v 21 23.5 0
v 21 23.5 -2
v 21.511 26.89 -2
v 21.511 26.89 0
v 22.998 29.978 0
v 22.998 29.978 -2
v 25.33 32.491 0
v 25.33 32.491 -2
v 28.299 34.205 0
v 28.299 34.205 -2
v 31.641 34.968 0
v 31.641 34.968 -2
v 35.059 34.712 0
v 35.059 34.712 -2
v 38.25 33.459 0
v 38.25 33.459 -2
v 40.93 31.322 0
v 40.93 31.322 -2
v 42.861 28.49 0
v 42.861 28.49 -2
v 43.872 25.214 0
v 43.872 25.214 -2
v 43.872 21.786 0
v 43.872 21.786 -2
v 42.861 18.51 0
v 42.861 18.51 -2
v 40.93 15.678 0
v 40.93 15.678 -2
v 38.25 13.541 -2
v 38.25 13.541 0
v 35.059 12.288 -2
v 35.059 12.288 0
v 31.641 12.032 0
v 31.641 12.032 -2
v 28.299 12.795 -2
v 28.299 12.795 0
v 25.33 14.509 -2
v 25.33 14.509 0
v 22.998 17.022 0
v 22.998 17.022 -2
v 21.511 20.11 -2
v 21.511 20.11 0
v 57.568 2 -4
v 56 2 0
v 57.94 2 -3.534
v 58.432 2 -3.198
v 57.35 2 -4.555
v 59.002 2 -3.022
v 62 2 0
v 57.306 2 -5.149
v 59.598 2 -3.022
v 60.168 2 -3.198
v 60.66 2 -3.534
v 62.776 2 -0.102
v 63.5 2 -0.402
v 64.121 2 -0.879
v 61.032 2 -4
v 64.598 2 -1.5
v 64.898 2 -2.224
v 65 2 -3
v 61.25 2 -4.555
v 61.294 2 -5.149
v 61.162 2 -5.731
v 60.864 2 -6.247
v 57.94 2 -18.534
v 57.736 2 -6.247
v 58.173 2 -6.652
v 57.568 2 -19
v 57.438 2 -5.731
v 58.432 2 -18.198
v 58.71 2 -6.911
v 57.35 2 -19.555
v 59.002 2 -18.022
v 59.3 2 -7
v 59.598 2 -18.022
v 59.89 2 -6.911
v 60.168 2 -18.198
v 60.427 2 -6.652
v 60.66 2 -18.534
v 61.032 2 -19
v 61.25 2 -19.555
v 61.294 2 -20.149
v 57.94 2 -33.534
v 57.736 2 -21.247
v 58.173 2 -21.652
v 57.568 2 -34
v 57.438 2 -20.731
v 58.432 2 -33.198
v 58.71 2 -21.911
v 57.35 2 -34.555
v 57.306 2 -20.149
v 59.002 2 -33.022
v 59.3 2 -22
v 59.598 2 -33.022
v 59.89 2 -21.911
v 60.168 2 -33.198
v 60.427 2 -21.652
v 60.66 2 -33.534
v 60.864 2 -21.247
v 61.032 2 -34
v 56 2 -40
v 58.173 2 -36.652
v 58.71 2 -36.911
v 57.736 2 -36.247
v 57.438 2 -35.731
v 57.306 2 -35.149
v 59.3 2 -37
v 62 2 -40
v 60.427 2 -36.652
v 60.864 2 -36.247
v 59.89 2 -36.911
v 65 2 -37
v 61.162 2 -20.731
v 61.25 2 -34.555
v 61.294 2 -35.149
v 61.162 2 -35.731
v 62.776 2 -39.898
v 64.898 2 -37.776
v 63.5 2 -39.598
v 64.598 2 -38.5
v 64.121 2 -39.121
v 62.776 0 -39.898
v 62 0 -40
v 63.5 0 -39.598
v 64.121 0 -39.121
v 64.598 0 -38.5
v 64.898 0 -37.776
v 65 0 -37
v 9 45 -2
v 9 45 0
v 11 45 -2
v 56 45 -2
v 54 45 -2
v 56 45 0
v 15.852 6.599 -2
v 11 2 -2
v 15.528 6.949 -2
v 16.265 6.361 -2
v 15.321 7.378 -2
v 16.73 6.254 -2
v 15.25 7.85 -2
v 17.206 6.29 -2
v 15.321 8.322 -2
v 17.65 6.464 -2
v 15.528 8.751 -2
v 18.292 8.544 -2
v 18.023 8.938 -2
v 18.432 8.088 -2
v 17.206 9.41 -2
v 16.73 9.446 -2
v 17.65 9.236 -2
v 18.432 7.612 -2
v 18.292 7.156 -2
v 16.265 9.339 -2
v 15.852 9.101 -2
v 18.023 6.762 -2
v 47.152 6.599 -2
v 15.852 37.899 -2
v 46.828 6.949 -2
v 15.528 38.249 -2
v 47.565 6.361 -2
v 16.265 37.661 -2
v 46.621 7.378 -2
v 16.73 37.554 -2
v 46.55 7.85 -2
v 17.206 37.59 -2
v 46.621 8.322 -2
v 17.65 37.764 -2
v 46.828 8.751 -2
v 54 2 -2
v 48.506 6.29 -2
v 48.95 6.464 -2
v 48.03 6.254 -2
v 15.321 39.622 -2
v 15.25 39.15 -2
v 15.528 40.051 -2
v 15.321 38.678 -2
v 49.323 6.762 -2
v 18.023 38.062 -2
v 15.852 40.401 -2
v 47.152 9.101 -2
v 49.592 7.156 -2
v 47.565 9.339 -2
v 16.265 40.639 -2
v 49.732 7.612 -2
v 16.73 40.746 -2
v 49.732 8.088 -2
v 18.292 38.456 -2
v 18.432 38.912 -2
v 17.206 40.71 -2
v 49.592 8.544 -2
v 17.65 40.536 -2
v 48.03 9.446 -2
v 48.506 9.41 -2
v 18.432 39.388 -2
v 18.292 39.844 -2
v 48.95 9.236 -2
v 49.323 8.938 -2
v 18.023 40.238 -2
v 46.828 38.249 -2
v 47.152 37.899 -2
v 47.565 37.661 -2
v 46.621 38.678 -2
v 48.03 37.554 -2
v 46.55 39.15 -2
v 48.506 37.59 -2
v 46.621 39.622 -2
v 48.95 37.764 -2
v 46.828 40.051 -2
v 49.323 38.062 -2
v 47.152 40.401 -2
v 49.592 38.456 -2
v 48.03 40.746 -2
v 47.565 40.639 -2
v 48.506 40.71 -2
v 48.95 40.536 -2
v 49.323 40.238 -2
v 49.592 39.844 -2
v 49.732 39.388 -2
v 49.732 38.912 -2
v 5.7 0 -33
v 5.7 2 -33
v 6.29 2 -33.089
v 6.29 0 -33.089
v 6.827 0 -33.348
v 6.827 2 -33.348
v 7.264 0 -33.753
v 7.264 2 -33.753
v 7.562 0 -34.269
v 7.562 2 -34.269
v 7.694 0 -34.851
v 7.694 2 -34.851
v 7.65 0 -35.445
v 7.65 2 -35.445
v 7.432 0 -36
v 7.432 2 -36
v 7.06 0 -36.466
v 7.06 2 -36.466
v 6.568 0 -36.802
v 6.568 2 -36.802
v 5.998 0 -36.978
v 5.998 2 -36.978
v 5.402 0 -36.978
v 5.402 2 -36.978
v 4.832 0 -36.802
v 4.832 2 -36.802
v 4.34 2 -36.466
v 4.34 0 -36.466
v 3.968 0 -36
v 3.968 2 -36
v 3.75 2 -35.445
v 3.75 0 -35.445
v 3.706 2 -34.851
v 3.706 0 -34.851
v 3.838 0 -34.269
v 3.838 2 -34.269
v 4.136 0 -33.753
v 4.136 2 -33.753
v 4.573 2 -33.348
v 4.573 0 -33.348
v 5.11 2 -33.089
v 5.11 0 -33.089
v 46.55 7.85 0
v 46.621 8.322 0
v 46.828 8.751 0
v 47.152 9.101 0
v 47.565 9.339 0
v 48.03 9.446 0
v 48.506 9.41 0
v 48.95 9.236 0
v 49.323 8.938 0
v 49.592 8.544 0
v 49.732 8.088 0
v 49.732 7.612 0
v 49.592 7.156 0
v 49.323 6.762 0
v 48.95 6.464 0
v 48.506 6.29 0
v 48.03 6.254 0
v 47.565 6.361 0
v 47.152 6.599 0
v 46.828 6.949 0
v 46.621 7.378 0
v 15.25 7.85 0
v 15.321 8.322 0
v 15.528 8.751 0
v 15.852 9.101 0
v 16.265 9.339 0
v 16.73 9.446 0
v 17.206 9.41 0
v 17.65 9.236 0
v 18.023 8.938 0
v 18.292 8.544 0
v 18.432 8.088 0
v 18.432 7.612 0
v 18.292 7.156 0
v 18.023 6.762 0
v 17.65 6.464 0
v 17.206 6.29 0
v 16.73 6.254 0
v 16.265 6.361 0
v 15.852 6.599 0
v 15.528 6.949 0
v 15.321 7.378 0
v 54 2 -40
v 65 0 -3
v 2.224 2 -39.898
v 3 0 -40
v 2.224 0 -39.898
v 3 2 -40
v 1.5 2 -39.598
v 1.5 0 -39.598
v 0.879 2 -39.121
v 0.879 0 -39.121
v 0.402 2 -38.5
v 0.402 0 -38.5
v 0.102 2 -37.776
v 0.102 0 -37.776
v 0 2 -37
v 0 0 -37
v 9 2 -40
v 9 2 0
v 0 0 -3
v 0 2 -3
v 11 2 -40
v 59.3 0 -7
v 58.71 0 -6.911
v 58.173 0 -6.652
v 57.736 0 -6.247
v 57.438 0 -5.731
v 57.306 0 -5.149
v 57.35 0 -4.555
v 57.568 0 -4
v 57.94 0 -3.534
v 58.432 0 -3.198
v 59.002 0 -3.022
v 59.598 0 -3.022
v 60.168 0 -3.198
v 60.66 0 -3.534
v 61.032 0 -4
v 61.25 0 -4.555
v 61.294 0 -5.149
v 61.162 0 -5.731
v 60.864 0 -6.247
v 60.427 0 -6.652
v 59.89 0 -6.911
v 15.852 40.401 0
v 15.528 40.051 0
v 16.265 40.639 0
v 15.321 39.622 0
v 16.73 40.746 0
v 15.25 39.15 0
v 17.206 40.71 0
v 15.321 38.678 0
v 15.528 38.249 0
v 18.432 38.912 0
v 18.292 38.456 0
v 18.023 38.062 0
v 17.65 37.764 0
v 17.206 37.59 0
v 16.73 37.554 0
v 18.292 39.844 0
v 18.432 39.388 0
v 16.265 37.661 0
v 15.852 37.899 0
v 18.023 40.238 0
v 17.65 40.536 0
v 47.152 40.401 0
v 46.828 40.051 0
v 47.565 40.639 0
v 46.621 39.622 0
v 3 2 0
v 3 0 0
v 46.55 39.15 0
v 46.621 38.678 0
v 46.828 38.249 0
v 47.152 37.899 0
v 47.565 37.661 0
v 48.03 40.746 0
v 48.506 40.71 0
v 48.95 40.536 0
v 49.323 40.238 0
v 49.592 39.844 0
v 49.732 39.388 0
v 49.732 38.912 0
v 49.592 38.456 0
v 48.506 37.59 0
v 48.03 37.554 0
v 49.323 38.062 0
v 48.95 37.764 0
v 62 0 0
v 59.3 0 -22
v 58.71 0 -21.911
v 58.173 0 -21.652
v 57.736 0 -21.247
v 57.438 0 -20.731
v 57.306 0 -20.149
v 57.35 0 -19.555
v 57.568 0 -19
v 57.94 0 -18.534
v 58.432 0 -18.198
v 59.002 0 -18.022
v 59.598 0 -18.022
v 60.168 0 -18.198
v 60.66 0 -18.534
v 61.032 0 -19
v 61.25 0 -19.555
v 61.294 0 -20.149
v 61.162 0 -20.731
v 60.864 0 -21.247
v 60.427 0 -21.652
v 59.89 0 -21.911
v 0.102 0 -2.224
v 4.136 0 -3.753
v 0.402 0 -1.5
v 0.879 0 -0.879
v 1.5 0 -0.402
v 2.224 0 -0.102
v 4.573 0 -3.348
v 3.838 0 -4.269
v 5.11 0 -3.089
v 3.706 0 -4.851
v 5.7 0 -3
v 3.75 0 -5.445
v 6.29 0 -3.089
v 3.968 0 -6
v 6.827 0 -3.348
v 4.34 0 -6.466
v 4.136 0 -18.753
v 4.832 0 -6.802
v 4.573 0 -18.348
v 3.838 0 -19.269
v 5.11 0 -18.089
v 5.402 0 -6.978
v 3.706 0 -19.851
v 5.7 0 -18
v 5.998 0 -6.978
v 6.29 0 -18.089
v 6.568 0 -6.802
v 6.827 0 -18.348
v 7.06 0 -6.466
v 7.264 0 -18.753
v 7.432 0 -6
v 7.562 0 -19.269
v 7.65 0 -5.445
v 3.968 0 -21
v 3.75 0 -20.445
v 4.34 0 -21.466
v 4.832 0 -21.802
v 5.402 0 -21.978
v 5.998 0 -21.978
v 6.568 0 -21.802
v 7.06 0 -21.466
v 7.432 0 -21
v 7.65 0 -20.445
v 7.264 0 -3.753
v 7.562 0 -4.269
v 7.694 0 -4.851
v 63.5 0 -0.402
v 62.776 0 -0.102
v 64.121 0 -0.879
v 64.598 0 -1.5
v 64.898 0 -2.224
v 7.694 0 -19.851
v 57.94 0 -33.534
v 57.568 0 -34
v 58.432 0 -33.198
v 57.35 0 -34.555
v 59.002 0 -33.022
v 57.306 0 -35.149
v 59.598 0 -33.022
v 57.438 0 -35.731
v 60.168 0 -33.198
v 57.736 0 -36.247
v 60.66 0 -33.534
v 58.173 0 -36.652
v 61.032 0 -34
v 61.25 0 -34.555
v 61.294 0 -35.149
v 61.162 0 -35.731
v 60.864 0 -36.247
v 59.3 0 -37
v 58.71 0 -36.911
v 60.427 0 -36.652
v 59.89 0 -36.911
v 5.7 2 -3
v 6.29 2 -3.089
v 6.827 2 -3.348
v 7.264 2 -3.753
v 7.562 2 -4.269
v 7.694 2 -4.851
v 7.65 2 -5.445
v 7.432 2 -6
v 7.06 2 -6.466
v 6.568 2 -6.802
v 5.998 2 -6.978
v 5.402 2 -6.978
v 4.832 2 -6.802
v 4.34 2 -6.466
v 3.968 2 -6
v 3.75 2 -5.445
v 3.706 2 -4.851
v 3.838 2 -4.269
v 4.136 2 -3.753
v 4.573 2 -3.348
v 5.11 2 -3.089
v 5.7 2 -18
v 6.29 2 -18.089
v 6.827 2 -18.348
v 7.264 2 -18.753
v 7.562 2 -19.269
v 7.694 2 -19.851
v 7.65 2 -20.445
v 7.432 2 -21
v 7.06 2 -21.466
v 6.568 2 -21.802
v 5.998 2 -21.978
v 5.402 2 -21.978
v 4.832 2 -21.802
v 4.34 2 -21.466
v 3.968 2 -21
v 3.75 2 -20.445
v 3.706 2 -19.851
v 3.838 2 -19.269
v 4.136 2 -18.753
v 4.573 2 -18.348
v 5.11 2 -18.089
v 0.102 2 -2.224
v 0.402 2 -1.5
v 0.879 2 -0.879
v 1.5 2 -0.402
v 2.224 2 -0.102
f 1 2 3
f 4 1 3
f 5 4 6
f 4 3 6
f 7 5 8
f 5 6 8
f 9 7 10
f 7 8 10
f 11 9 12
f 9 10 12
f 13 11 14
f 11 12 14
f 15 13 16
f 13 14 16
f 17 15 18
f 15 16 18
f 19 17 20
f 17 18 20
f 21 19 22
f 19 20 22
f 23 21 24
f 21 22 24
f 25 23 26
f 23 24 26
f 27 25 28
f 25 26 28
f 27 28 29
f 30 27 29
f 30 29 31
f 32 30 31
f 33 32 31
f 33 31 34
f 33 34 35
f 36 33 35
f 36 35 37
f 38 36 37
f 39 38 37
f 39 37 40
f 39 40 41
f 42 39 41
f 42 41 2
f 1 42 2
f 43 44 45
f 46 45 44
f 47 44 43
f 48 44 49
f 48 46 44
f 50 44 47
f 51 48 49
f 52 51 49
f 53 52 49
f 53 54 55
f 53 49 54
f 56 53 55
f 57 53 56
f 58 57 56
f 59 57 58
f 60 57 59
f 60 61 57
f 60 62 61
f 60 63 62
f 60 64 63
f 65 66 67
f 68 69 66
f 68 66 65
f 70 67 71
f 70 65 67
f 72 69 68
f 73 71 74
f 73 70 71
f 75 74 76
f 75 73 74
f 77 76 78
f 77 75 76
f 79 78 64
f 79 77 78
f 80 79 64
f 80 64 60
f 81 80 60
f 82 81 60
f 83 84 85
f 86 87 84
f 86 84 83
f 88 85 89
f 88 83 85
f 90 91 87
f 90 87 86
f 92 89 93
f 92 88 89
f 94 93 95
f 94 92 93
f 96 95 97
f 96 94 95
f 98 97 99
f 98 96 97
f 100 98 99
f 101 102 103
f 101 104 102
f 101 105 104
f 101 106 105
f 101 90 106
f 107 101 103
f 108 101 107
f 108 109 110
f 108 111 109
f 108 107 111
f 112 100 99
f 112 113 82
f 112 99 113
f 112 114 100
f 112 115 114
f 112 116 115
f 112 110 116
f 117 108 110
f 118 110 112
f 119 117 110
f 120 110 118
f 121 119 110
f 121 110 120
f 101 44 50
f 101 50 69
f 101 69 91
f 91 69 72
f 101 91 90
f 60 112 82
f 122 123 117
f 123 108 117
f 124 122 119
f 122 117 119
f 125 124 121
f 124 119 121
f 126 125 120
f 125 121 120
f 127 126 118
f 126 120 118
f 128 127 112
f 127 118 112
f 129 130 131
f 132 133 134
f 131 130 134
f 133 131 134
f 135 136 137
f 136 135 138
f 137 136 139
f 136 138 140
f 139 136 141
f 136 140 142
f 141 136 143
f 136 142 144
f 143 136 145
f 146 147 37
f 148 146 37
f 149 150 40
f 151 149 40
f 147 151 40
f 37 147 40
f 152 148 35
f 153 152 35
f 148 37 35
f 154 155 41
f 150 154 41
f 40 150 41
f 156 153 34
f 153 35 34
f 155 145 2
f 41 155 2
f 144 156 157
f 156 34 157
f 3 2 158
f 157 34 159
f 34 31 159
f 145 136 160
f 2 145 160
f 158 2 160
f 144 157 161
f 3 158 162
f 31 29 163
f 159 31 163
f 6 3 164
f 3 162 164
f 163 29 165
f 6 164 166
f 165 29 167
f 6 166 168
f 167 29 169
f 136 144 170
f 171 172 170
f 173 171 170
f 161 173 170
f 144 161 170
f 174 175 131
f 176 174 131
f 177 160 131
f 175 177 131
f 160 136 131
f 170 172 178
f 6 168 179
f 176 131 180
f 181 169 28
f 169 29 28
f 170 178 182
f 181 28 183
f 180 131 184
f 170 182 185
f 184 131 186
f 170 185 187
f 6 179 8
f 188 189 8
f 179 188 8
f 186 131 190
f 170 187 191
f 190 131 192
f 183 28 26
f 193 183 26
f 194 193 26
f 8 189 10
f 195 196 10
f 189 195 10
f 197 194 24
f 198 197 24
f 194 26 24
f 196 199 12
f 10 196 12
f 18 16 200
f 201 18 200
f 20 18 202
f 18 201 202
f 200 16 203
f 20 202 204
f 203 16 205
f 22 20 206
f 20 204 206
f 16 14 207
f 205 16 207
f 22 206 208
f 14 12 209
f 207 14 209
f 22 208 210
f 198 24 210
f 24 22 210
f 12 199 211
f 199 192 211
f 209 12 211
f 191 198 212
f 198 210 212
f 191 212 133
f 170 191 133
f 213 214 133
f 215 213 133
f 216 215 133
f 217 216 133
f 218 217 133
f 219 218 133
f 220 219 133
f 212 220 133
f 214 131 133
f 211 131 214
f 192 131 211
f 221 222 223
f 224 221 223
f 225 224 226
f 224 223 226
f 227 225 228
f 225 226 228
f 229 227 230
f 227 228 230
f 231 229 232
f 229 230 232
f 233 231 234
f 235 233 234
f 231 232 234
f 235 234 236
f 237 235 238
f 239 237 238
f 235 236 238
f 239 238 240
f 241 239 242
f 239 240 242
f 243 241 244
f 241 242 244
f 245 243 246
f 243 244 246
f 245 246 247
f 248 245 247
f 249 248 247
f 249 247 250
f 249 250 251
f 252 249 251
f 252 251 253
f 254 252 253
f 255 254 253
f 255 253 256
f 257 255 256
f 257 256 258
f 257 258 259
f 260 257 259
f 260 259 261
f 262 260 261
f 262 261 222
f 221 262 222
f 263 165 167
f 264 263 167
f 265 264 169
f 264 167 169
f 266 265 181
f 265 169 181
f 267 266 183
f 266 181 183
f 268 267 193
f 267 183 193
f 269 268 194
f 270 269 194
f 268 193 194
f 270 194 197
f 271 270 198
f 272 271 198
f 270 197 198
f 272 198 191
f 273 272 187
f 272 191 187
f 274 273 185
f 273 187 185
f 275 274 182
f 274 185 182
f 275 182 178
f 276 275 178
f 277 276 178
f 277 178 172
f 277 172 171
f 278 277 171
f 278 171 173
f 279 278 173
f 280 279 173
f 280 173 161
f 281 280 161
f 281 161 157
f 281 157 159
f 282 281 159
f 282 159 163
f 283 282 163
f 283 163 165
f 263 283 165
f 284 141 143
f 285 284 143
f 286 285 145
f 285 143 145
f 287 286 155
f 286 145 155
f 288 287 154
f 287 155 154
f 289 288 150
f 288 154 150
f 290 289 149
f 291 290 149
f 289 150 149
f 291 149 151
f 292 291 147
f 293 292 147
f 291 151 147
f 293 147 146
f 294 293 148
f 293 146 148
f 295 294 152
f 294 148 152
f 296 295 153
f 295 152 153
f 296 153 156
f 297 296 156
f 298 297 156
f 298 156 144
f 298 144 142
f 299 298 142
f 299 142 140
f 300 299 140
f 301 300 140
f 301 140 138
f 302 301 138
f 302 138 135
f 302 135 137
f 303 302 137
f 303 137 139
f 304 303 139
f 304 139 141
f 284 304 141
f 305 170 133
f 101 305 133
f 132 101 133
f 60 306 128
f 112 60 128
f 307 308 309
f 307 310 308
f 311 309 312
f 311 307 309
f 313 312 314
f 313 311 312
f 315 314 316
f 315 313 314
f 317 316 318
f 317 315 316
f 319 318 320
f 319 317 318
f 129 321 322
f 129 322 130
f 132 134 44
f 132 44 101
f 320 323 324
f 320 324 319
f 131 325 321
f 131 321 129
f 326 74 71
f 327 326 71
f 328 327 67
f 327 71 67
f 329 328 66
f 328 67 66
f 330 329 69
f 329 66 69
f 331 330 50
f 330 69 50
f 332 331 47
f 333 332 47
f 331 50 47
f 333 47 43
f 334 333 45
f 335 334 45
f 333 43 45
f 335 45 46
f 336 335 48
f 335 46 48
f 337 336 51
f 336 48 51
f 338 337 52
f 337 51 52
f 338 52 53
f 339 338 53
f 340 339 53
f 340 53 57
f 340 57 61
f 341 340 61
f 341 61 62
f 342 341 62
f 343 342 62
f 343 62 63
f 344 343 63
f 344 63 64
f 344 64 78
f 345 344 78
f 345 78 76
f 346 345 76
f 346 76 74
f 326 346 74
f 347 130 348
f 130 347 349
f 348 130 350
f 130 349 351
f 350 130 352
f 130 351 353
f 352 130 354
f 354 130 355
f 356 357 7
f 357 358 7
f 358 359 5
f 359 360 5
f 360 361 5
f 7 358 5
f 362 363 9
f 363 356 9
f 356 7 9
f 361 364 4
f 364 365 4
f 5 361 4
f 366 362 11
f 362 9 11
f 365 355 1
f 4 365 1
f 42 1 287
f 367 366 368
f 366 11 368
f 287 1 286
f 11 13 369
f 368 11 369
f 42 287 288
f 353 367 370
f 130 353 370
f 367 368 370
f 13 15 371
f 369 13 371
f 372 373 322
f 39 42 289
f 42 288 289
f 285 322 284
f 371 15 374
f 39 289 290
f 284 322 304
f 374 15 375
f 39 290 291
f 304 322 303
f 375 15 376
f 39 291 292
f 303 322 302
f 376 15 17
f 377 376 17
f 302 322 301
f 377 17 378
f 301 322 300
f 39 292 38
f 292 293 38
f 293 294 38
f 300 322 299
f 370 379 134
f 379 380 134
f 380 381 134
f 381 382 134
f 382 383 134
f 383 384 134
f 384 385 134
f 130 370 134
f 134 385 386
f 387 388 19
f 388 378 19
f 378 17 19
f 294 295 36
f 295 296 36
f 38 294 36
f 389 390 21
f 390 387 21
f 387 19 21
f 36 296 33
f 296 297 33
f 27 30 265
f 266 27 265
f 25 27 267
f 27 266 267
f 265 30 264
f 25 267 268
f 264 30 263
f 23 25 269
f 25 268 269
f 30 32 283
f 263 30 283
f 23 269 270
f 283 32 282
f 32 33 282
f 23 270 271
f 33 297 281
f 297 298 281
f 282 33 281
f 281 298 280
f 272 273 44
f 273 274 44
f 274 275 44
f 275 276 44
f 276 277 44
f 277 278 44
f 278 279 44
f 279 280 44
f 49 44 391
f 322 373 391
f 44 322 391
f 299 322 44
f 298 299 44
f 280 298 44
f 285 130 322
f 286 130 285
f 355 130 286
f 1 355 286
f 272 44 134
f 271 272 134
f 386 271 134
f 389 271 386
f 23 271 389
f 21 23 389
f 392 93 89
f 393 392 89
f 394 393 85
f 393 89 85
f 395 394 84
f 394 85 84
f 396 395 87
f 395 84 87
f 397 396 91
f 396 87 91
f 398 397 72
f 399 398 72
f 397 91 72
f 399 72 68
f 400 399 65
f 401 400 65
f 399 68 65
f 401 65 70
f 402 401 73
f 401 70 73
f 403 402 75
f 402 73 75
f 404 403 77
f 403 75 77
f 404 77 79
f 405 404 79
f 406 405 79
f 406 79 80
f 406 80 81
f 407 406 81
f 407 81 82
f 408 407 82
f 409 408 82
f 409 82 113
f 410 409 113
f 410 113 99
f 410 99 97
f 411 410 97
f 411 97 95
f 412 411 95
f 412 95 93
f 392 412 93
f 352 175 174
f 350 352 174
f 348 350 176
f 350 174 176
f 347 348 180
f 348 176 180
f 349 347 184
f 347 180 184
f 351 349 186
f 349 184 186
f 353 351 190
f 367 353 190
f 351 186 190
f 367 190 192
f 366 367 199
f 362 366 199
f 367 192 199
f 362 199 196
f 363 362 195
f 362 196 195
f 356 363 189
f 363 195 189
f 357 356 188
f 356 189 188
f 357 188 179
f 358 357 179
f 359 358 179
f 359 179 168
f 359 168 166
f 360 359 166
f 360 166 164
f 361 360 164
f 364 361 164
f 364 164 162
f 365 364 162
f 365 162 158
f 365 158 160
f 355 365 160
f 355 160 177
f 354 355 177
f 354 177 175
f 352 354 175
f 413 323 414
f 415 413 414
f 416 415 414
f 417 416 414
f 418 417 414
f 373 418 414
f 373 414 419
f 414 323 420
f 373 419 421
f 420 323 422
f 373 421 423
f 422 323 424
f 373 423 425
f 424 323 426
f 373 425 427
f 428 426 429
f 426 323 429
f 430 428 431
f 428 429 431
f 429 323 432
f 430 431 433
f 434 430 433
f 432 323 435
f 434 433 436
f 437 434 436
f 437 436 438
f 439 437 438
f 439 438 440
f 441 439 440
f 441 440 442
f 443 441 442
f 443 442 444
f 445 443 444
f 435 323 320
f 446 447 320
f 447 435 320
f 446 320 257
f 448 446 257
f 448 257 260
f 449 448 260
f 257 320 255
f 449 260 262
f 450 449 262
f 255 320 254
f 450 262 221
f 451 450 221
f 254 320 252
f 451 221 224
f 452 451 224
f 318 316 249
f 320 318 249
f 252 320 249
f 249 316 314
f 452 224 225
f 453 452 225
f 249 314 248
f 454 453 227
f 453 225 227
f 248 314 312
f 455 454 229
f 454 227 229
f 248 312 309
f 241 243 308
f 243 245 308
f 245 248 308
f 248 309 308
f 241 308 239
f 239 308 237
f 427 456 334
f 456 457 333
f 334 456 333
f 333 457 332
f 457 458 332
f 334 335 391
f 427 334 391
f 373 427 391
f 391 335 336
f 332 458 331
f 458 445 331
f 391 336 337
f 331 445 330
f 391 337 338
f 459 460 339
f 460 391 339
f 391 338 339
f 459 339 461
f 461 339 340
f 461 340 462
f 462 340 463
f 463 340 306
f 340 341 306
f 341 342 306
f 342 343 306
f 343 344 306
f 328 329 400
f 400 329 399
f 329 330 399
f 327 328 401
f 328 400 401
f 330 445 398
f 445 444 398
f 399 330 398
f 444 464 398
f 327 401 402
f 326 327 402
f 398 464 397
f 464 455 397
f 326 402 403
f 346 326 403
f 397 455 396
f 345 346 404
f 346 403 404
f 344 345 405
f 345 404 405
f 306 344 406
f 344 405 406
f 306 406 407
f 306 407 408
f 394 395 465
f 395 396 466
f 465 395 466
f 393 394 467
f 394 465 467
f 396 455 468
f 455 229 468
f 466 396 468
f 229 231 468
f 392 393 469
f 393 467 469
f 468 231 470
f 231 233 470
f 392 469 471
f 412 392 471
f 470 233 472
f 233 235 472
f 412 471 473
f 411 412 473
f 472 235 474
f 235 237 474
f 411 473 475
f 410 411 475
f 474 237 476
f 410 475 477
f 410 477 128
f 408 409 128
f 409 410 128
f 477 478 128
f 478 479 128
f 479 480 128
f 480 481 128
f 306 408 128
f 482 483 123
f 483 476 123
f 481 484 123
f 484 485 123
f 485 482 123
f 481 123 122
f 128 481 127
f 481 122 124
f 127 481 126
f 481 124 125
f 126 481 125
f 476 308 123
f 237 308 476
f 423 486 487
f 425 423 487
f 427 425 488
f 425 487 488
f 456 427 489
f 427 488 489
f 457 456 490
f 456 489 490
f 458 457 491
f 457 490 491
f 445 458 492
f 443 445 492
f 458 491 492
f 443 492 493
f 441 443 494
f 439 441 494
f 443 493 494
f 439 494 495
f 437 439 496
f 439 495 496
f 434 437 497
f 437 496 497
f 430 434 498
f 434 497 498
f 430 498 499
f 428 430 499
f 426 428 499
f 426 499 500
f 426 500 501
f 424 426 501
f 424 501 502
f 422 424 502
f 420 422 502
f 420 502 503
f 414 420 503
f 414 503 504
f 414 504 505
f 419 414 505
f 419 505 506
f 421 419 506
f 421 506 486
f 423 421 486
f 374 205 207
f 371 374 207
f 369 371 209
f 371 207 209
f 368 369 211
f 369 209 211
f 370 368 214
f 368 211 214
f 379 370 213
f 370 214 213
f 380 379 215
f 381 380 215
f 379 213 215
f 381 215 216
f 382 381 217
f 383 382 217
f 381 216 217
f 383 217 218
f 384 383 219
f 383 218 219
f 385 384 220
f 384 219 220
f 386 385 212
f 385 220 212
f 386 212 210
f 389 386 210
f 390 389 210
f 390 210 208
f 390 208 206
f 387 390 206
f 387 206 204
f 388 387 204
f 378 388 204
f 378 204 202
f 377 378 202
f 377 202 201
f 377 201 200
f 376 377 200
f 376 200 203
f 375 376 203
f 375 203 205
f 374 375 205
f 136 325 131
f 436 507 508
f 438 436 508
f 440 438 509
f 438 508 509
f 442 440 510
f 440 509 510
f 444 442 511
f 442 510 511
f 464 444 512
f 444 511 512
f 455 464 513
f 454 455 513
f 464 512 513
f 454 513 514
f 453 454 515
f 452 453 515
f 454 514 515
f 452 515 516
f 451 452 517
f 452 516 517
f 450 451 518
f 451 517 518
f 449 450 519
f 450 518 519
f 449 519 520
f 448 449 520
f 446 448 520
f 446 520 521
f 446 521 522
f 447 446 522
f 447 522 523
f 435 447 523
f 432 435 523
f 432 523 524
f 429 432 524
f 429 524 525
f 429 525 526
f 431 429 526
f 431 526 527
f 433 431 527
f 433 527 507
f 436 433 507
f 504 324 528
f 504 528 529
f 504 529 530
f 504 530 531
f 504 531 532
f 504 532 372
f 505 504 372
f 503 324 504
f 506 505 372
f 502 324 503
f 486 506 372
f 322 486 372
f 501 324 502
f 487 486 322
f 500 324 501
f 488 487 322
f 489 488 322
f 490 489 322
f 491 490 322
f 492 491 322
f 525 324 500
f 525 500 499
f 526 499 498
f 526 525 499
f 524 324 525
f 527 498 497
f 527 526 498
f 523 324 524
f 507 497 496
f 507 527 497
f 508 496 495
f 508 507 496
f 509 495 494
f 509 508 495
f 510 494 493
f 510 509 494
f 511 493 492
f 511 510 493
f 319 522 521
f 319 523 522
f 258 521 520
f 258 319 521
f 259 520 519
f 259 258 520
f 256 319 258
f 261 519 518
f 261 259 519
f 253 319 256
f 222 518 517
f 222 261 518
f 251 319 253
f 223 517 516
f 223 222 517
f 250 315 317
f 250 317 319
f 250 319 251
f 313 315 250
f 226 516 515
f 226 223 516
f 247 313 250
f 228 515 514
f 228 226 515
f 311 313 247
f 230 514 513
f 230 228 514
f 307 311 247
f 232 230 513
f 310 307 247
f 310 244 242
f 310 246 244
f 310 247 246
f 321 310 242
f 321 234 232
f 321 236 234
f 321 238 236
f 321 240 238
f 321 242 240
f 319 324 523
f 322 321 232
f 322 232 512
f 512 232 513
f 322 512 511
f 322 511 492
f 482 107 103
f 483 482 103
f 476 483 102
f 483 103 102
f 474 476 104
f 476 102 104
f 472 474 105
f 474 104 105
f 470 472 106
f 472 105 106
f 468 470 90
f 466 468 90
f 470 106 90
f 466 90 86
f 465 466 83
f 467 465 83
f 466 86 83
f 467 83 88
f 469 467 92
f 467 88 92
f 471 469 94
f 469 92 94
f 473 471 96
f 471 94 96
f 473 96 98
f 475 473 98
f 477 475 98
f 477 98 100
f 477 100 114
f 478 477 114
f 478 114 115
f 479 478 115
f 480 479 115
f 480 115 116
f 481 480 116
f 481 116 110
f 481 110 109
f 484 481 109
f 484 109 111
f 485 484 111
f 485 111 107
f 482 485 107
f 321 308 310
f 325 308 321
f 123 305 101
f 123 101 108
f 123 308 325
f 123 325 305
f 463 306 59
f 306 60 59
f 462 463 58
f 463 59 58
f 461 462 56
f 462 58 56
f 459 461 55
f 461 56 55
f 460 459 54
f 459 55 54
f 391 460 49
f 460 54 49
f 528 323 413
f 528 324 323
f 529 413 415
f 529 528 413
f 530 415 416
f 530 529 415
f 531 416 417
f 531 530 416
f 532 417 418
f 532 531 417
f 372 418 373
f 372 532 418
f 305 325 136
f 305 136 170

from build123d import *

# Parameters (mm, degrees)
SKETCH_1_W          = 65
SKETCH_1_H          = 40
EXTRUDE_1_DEPTH     = 2
SKETCH_2_R          = 2
CUT_EXTRUDE_1_DEPTH = 77.347887987
SKETCH_3_W          = 47
SKETCH_3_H          = 43
EXTRUDE_2_DEPTH     = 2
RIB_1_REACH         = 84.225
SKETCH_5_WALL_W     = 223.835267426
SKETCH_5_WALL_H     = 2
RIB_2_REACH         = 84.225
SKETCH_6_WALL_W     = 223.835267426
SKETCH_6_WALL_H     = 2
SKETCH_7_R          = 11.5
SKETCH_7_R_2        = 1.6
CUT_EXTRUDE_2_DEPTH = 88.715449038
FILLET_1_R          = 3


with BuildPart() as part:
    # 草图1 → 凸台-拉伸1 (new body)
    with BuildSketch(Plane(origin=(0, 0, 0), x_dir=(1, 0, 0), z_dir=(0, 1, 0))):
        with Locations((32.5, 20)):
            Rectangle(SKETCH_1_W, SKETCH_1_H)
    extrude(amount=EXTRUDE_1_DEPTH)

    # 草图2 → 切除-拉伸1 (cut, through all)
    with BuildSketch(Plane(origin=(0, 2, 0), x_dir=(1, 0, 0), z_dir=(0, 1, 0))):
        with Locations((5.7, 5)):
            Circle(SKETCH_2_R)
        with Locations((5.7, 20)):
            Circle(SKETCH_2_R)
        with Locations((5.7, 35)):
            Circle(SKETCH_2_R)
        with Locations((59.3, 5)):
            Circle(SKETCH_2_R)
        with Locations((59.3, 20)):
            Circle(SKETCH_2_R)
        with Locations((59.3, 35)):
            Circle(SKETCH_2_R)
    extrude(amount=-CUT_EXTRUDE_1_DEPTH, mode=Mode.SUBTRACT)

    # 草图3 → 凸台-拉伸2 (add)
    with BuildSketch(Plane.XY):
        with Locations((32.5, 23.5)):
            Rectangle(SKETCH_3_W, SKETCH_3_H)
    extrude(amount=-EXTRUDE_2_DEPTH)

    # 草图5 wall → 筋1 (add, up to next)
    with BuildSketch(Plane(origin=(9, 23.5, -21), x_dir=(0, 0.749329085481, 0.662197796472), z_dir=(0, 0.662197796472, -0.749329085481)), mode=Mode.PRIVATE) as rib_1_sk1:
        with Locations((0, 1)):
            Rectangle(SKETCH_5_WALL_W, SKETCH_5_WALL_H)
    rib_1_tool1 = extrude(rib_1_sk1.sketch, amount=-RIB_1_REACH, mode=Mode.PRIVATE) - part.part
    add(rib_1_tool1.solids().sort_by_distance((9, 23.5, -21))[0])

    # 草图6 wall → 筋2 (add, up to next)
    with BuildSketch(Plane(origin=(56, 23.5, -21), x_dir=(0, -0.749329085481, -0.662197796472), z_dir=(0, 0.662197796472, -0.749329085481)), mode=Mode.PRIVATE) as rib_2_sk1:
        with Locations((0, 1)):
            Rectangle(SKETCH_6_WALL_W, SKETCH_6_WALL_H)
    rib_2_tool1 = extrude(rib_2_sk1.sketch, amount=-RIB_2_REACH, mode=Mode.PRIVATE) - part.part
    add(rib_2_tool1.solids().sort_by_distance((56, 23.5, -21))[0])

    # 草图7 → 切除-拉伸2 (cut, through all)
    with BuildSketch(Plane(origin=(0, 0, -2), x_dir=(-1, 0, 0), z_dir=(0, 0, -1))):
        with Locations((-32.5, 23.5)):
            Circle(SKETCH_7_R)
        with Locations((-48.15, 7.85)):
            Circle(SKETCH_7_R_2)
        with Locations((-16.85, 7.85)):
            Circle(SKETCH_7_R_2)
        with Locations((-16.85, 39.15)):
            Circle(SKETCH_7_R_2)
        with Locations((-48.15, 39.15)):
            Circle(SKETCH_7_R_2)
    extrude(amount=-CUT_EXTRUDE_2_DEPTH, mode=Mode.SUBTRACT)

    # 圆角1
    fillet_1_edges = [part.edges().sort_by_distance(p)[0] for p in [
        (65, 1, -40),
        (65, 1, 0),
        (0, 1, -40),
        (0, 1, 0),
    ]]
    fillet(fillet_1_edges, radius=FILLET_1_R)


solid = part.part
